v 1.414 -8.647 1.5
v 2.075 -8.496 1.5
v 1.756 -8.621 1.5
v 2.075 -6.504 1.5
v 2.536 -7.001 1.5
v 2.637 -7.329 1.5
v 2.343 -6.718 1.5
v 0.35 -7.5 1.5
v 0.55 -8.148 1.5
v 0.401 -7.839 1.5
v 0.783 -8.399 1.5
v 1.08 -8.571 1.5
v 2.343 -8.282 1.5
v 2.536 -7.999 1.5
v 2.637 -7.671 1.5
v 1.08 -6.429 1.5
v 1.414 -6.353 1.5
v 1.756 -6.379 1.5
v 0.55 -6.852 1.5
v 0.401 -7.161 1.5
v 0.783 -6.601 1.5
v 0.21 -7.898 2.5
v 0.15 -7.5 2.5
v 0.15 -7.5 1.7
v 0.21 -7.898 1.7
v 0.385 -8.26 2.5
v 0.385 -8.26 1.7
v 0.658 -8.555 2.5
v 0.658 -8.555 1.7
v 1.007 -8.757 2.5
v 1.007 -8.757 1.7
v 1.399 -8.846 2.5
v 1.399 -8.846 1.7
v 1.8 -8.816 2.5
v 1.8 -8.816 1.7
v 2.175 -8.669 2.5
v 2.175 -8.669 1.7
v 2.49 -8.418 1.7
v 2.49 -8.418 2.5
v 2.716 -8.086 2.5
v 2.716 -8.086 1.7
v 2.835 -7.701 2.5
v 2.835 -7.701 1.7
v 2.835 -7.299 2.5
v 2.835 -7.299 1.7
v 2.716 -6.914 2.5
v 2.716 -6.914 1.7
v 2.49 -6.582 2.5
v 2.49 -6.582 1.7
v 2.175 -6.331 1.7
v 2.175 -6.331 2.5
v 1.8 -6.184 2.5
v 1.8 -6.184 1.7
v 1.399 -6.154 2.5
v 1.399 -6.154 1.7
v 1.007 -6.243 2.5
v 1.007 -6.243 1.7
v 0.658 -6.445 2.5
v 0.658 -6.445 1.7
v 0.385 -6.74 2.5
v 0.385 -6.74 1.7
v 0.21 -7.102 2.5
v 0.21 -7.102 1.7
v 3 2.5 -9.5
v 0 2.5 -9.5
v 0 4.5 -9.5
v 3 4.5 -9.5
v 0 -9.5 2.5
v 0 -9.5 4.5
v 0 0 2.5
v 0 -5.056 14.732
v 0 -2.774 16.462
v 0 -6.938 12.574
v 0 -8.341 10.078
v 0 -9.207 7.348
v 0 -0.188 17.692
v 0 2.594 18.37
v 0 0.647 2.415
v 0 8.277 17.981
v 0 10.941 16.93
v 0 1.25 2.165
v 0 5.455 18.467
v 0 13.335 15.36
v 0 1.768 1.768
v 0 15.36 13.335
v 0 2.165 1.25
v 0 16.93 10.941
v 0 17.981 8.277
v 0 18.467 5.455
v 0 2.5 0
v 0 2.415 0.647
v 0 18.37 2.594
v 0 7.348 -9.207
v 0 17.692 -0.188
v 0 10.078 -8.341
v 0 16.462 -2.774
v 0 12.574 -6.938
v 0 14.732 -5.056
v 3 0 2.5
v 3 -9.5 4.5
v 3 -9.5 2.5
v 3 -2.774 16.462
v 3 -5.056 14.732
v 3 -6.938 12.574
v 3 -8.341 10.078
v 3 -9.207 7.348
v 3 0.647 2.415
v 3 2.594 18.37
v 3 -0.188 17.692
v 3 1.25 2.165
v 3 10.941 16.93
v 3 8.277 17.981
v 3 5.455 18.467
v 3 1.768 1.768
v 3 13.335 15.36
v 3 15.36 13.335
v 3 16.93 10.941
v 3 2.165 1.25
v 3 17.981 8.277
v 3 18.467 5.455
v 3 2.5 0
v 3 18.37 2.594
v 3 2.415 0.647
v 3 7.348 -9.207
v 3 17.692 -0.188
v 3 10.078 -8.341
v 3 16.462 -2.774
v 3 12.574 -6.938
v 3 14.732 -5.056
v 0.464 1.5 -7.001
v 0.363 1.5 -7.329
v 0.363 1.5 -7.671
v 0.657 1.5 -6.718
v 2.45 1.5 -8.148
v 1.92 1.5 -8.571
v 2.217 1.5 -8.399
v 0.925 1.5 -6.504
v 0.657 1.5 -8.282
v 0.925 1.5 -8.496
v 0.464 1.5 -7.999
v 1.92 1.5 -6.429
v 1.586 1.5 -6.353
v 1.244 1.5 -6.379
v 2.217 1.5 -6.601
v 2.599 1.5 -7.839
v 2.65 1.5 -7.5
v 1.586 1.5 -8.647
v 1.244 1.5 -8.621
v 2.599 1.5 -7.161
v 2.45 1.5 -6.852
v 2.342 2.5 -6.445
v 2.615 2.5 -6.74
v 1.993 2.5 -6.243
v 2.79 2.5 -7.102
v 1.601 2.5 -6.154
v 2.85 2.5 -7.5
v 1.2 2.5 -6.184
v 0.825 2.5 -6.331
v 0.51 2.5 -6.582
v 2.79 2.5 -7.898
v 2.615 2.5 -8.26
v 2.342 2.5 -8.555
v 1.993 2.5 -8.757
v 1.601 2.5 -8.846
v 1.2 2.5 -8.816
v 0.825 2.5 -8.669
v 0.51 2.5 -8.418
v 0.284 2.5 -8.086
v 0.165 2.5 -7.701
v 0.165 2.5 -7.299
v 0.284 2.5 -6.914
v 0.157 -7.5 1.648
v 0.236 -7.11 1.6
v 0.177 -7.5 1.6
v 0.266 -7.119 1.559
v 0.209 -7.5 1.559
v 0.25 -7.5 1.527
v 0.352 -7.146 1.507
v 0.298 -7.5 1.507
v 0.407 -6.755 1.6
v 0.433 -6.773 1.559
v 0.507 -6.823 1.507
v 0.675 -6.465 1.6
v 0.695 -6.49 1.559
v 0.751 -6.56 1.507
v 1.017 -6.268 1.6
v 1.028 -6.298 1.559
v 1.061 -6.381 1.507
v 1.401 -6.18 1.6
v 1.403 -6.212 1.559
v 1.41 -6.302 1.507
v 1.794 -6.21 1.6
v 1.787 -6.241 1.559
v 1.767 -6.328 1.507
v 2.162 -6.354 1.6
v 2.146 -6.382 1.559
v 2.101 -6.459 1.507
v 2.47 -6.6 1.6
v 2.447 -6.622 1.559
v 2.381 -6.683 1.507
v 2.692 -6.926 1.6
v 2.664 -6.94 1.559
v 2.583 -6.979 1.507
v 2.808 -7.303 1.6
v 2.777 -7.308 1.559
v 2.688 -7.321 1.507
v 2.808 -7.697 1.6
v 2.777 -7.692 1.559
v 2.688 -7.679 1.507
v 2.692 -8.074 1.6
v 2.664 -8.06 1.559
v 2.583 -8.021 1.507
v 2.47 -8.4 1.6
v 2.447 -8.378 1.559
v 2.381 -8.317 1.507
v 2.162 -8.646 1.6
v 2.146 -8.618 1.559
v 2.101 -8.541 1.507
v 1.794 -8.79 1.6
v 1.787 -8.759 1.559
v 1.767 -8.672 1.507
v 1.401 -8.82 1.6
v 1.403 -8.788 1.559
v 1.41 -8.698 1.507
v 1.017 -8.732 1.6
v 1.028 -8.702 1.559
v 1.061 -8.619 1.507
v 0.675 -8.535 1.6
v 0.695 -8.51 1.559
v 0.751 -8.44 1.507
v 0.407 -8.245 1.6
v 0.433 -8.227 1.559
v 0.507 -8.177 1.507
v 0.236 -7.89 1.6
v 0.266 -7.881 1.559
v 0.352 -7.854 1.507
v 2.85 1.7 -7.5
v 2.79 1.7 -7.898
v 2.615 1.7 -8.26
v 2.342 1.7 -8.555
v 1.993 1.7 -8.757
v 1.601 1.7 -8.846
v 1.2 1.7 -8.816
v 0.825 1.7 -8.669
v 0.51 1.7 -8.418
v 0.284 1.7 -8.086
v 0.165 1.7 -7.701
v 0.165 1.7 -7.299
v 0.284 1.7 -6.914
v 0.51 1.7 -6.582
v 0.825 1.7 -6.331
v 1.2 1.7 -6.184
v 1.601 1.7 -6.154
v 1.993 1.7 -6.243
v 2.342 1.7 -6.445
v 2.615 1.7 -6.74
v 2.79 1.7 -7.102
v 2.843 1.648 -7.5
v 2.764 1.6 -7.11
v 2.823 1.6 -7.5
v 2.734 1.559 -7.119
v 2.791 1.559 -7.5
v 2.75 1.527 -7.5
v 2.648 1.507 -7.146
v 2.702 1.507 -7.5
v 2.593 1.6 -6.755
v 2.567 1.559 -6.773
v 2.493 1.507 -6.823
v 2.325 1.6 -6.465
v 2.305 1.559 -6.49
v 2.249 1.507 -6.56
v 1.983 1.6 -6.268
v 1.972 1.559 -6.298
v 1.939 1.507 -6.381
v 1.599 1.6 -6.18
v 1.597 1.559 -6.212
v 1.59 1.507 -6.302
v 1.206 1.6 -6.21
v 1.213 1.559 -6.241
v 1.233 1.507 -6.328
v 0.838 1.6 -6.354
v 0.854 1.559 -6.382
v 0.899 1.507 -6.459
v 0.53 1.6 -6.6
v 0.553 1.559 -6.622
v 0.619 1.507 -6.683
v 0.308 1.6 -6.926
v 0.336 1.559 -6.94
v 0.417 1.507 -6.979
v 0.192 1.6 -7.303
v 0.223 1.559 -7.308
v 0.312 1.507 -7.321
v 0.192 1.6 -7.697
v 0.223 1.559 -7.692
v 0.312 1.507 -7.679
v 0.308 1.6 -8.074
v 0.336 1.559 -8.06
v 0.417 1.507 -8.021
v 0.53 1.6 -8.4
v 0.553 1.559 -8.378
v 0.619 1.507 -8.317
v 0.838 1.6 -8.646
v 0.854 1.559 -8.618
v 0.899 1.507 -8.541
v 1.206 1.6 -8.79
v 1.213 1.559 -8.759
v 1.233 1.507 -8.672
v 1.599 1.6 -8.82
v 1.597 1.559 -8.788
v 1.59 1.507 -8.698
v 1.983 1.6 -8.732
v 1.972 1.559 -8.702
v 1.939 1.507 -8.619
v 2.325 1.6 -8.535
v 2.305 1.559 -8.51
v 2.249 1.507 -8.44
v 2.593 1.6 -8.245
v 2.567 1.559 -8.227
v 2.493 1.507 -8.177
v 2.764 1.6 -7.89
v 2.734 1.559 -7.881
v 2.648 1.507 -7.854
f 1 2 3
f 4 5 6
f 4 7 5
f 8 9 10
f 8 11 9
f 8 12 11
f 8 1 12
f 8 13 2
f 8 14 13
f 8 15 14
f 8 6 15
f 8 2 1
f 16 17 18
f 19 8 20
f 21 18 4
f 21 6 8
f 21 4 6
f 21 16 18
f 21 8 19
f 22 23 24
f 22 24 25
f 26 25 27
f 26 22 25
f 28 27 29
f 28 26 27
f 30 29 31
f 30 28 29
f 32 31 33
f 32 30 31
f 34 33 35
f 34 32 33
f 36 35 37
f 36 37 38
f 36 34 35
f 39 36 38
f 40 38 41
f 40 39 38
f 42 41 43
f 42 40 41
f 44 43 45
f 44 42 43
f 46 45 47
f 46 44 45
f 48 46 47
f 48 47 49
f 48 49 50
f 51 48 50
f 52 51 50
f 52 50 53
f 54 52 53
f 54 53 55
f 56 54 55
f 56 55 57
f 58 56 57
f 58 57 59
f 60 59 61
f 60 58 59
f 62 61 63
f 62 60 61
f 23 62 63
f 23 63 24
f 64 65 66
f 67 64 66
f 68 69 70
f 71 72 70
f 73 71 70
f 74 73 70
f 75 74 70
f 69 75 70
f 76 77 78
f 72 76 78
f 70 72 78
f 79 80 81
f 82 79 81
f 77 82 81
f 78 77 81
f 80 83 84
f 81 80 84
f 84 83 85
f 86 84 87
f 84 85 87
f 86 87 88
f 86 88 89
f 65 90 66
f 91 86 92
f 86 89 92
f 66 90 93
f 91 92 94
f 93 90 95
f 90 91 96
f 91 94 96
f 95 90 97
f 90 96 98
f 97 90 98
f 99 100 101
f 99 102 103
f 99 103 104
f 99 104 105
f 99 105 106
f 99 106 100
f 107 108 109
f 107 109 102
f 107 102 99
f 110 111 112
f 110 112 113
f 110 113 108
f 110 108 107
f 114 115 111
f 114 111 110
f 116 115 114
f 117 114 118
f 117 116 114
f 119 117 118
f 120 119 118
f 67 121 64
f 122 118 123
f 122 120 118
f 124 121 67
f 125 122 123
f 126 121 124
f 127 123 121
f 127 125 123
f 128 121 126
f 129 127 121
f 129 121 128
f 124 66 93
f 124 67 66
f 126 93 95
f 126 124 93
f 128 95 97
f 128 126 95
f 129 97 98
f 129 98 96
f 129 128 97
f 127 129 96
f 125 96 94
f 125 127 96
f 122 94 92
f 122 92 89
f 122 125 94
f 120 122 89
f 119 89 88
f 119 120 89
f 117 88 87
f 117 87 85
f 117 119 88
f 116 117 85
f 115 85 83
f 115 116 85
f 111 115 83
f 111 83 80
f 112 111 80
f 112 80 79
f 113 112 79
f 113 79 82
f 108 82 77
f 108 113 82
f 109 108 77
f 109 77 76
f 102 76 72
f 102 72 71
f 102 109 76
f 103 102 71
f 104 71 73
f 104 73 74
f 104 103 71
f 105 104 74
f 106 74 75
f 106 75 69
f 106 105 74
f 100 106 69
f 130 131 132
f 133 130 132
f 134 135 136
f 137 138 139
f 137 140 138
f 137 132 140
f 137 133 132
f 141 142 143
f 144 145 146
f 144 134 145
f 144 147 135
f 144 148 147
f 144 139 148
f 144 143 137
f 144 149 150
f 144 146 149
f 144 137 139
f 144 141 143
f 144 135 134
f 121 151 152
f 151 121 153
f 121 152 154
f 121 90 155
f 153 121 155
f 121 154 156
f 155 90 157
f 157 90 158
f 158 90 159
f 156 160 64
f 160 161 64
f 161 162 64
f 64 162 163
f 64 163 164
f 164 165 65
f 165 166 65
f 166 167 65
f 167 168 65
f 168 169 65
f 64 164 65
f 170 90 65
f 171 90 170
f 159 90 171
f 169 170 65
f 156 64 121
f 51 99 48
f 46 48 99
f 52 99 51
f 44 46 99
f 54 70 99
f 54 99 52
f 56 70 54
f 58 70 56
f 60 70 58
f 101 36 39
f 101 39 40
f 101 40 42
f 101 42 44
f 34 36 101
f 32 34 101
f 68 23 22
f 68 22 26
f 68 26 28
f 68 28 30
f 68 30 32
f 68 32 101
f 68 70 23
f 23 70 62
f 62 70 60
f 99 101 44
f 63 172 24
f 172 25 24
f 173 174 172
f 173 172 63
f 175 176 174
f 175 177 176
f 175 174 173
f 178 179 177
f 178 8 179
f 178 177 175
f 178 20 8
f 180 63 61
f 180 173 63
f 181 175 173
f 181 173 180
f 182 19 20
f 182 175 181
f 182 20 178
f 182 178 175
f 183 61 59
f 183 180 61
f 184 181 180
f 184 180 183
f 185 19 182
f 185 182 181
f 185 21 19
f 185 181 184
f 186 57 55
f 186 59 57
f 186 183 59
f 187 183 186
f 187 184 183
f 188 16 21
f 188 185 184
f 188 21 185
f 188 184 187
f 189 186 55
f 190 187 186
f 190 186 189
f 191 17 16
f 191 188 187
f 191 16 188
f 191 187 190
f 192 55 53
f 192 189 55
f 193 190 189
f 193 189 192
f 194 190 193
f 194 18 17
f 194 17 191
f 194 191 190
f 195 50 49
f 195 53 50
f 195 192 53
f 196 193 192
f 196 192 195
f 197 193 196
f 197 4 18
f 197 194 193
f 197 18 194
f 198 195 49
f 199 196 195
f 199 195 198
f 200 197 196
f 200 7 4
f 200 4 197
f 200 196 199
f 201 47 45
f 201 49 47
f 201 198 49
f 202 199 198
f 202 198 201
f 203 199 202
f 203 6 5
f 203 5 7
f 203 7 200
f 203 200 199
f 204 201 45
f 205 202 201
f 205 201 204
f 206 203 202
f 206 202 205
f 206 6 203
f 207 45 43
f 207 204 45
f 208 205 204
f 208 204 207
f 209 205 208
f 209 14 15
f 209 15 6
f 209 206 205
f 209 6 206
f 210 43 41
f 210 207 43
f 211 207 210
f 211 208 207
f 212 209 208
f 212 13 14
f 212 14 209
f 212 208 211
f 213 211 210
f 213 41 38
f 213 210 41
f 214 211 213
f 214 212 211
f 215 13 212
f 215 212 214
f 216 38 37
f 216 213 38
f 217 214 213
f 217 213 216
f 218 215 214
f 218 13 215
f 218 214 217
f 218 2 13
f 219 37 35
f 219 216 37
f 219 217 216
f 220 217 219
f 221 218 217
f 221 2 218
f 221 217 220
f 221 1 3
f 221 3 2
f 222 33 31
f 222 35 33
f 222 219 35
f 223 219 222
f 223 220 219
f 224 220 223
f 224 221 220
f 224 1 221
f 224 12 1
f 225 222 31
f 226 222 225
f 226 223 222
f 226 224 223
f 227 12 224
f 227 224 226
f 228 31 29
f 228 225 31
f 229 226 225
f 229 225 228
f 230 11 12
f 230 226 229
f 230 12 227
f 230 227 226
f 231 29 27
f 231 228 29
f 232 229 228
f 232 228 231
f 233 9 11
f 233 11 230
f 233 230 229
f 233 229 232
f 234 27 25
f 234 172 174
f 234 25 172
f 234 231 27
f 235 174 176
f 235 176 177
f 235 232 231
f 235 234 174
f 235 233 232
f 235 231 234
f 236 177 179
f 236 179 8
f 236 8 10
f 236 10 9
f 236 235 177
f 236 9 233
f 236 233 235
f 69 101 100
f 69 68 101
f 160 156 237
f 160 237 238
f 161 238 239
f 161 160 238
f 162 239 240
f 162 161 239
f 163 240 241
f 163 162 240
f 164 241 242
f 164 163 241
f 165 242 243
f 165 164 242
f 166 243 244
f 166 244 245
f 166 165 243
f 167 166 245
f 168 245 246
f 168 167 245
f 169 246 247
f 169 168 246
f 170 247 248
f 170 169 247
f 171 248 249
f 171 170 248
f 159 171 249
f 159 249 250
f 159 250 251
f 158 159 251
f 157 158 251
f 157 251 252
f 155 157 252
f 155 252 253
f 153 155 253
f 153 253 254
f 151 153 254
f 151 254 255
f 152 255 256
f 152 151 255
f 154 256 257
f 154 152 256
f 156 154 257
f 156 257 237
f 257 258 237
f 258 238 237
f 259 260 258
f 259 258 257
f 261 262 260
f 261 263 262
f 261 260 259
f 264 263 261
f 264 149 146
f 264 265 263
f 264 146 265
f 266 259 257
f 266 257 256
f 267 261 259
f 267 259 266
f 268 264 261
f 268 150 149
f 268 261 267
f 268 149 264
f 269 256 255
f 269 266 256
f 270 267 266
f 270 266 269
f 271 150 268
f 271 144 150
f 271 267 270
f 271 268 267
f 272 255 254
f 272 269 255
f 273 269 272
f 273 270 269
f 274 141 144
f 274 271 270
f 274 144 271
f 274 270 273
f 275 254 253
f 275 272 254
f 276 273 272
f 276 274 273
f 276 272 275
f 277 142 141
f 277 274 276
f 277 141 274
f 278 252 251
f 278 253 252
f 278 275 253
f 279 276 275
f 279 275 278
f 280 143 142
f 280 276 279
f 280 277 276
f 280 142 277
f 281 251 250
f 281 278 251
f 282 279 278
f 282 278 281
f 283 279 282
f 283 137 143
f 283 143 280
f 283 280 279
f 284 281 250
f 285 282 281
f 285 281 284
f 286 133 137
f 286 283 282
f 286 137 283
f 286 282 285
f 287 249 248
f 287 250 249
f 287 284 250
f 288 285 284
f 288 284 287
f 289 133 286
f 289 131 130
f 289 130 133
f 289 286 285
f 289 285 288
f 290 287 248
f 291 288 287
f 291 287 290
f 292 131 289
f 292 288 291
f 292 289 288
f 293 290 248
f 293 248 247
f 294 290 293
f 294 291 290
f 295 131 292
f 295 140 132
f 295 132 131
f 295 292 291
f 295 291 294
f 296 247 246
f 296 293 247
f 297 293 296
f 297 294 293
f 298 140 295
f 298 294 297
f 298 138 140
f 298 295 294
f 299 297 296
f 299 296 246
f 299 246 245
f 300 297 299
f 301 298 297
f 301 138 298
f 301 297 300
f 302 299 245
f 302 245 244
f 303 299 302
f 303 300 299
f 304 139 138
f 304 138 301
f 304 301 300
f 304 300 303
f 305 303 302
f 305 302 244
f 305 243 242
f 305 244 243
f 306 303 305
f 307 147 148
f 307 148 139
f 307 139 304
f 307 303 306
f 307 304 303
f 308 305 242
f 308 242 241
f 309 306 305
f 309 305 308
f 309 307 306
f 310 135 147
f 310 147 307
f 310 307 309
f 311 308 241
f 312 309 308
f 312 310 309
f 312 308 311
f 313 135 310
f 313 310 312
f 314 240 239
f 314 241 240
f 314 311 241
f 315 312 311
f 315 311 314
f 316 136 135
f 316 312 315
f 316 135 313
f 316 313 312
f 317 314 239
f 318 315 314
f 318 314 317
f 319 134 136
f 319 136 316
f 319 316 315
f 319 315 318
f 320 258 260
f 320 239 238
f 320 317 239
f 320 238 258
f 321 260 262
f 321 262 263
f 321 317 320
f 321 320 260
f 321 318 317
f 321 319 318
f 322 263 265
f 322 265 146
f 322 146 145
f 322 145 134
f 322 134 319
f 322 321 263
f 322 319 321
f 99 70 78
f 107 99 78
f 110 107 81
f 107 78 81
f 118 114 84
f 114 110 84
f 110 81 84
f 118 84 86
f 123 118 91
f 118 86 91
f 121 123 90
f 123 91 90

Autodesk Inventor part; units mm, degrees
ref_plane "YZ Plane" through (0, 0, 0) normal (1, 0, 0) x (0, 1, 0)
ref_plane "XZ Plane" through (0, 0, 0) normal (0, 1, 0) x (-1, 0, 0)
ref_plane "XY Plane" through (0, 0, 0) normal (0, 0, 1) x (1, 0, 0)
sketch "Boceto1" plane through (0, 0, 0) normal (1, 0, 0) x (0, 1, 0)
  circle A0 centre (0, 0) radius 2.5
  line L0 (2.5, 0) -> (2.5, 10.6639)
  line L1 (2.5, 2.5) -> (-7.5, 2.5)
  line L2 (-7.5, 2.5) -> (-9.5, 2.5)
  line L3 (-9.5, 2.5) -> (-9.5, 4.5)
  line L4 (-9.5, 4.5) -> (2.5, 4.5)
  line L5 (0, 0) -> (-4.5773, -4.5773)
  line L6 (0, 0) -> (6.4732, 0) construction
  circle A1 centre (0, 0) radius 2.5
  line L7 (0, 2.5) -> (10.6639, 2.5)
  line L8 (2.5, 2.5) -> (2.5, -7.5)
  line L9 (2.5, -7.5) -> (2.5, -9.5)
  line L10 (2.5, -9.5) -> (4.5, -9.5)
  line L11 (4.5, -9.5) -> (4.5, 2.5)
  line L12 (2.5, 4.5) -> (4.5, 4.5)
  line L13 (4.5, 4.5) -> (4.5, 2.5)
  point P0 (0, 2.5)
  dimension "d0" = 5
  dimension "d1" = 10
  dimension "d2" = 2
  dimension "d3" = 2
  dimension "d4" = 135
extrude "Extrusión1" add sketch "Boceto1" along normal blind 3 contours A0 L1 L0 | L0 L7 L11 L10 L9 L8 | L1 L2 L3 L4 L0 | L0 L12 L13 L7
sketch "Boceto2" plane through (3, 0, 0) normal (1, 0, 0) x (0, 0, -1)
  line L0 (-4.5, 4.5) -> (-4.5, -9.5) projected
  line L1 (-2.5, -9.5) -> (-2.5, 0) projected
  arc A0 (0, 2.5) -> (-2.5, 0) centre (0, 0) ccw projected
  line L2 (0, 2.5) -> (9.5, 2.5) projected
  line L3 (9.5, 2.5) -> (9.5, 4.5) projected
  line L4 (9.5, 4.5) -> (-4.5, 4.5) projected
  line L5 (-4.5, 4.5) -> (-4.5, -9.5) projected
  line L6 (-4.5, -9.5) -> (-2.5, -9.5) projected
  line L7 (9.5, 2.5) -> (9.5, 4.5) projected
  line L8 (9.5, 4.5) -> (16.7965, 4.5)
  line L9 (16.7965, 2.5) -> (9.5, 2.5)
  line L10 (9.5, 2.5) -> (16.7965, 2.5)
  line L11 (16.7965, 4.5) -> (16.7965, 2.5)
  circle A1 centre (-4.5, 4.5) radius 14
extrude "Extrusión2" add sketch "Boceto2" against normal blind 3 contours L0 A1 L4
sketch "Boceto3" plane through (0, 2.5, -9.5) normal (0, -1, 0) x (1, 0, 0)
  line L0 (0, 0) -> (3, 0) projected
  line L1 (1.5, 0) -> (1.5, 2)
  circle A0 centre (1.5, 2) radius 1.35
  point P0 (0, 9.5)
  dimension "d9" = 2
  dimension "d10" = 2.7
extrude "Extrusión3" add sketch "Boceto3" along normal blind 1
fillet "Empalme1" radius 0.2 1 edges at (0.15, 1.5, -7.5)
sketch "Boceto4" plane through (0, -9.5, 2.5) normal (0, 0, -1) x (-1, 0, 0)
  line L0 (0, 0) -> (-3, 0) projected
  line L1 (-1.5, 0) -> (-1.5, 2)
  circle A0 centre (-1.5, 2) radius 1.35
  point P0 (0, 9.5)
  dimension "d14" = 2
  dimension "d15" = 2.7
extrude "Extrusión4" add sketch "Boceto4" along normal blind 1
fillet "Empalme2" radius 0.2 1 edges at (2.85, -7.5, 1.5)
properties part number "oso"
